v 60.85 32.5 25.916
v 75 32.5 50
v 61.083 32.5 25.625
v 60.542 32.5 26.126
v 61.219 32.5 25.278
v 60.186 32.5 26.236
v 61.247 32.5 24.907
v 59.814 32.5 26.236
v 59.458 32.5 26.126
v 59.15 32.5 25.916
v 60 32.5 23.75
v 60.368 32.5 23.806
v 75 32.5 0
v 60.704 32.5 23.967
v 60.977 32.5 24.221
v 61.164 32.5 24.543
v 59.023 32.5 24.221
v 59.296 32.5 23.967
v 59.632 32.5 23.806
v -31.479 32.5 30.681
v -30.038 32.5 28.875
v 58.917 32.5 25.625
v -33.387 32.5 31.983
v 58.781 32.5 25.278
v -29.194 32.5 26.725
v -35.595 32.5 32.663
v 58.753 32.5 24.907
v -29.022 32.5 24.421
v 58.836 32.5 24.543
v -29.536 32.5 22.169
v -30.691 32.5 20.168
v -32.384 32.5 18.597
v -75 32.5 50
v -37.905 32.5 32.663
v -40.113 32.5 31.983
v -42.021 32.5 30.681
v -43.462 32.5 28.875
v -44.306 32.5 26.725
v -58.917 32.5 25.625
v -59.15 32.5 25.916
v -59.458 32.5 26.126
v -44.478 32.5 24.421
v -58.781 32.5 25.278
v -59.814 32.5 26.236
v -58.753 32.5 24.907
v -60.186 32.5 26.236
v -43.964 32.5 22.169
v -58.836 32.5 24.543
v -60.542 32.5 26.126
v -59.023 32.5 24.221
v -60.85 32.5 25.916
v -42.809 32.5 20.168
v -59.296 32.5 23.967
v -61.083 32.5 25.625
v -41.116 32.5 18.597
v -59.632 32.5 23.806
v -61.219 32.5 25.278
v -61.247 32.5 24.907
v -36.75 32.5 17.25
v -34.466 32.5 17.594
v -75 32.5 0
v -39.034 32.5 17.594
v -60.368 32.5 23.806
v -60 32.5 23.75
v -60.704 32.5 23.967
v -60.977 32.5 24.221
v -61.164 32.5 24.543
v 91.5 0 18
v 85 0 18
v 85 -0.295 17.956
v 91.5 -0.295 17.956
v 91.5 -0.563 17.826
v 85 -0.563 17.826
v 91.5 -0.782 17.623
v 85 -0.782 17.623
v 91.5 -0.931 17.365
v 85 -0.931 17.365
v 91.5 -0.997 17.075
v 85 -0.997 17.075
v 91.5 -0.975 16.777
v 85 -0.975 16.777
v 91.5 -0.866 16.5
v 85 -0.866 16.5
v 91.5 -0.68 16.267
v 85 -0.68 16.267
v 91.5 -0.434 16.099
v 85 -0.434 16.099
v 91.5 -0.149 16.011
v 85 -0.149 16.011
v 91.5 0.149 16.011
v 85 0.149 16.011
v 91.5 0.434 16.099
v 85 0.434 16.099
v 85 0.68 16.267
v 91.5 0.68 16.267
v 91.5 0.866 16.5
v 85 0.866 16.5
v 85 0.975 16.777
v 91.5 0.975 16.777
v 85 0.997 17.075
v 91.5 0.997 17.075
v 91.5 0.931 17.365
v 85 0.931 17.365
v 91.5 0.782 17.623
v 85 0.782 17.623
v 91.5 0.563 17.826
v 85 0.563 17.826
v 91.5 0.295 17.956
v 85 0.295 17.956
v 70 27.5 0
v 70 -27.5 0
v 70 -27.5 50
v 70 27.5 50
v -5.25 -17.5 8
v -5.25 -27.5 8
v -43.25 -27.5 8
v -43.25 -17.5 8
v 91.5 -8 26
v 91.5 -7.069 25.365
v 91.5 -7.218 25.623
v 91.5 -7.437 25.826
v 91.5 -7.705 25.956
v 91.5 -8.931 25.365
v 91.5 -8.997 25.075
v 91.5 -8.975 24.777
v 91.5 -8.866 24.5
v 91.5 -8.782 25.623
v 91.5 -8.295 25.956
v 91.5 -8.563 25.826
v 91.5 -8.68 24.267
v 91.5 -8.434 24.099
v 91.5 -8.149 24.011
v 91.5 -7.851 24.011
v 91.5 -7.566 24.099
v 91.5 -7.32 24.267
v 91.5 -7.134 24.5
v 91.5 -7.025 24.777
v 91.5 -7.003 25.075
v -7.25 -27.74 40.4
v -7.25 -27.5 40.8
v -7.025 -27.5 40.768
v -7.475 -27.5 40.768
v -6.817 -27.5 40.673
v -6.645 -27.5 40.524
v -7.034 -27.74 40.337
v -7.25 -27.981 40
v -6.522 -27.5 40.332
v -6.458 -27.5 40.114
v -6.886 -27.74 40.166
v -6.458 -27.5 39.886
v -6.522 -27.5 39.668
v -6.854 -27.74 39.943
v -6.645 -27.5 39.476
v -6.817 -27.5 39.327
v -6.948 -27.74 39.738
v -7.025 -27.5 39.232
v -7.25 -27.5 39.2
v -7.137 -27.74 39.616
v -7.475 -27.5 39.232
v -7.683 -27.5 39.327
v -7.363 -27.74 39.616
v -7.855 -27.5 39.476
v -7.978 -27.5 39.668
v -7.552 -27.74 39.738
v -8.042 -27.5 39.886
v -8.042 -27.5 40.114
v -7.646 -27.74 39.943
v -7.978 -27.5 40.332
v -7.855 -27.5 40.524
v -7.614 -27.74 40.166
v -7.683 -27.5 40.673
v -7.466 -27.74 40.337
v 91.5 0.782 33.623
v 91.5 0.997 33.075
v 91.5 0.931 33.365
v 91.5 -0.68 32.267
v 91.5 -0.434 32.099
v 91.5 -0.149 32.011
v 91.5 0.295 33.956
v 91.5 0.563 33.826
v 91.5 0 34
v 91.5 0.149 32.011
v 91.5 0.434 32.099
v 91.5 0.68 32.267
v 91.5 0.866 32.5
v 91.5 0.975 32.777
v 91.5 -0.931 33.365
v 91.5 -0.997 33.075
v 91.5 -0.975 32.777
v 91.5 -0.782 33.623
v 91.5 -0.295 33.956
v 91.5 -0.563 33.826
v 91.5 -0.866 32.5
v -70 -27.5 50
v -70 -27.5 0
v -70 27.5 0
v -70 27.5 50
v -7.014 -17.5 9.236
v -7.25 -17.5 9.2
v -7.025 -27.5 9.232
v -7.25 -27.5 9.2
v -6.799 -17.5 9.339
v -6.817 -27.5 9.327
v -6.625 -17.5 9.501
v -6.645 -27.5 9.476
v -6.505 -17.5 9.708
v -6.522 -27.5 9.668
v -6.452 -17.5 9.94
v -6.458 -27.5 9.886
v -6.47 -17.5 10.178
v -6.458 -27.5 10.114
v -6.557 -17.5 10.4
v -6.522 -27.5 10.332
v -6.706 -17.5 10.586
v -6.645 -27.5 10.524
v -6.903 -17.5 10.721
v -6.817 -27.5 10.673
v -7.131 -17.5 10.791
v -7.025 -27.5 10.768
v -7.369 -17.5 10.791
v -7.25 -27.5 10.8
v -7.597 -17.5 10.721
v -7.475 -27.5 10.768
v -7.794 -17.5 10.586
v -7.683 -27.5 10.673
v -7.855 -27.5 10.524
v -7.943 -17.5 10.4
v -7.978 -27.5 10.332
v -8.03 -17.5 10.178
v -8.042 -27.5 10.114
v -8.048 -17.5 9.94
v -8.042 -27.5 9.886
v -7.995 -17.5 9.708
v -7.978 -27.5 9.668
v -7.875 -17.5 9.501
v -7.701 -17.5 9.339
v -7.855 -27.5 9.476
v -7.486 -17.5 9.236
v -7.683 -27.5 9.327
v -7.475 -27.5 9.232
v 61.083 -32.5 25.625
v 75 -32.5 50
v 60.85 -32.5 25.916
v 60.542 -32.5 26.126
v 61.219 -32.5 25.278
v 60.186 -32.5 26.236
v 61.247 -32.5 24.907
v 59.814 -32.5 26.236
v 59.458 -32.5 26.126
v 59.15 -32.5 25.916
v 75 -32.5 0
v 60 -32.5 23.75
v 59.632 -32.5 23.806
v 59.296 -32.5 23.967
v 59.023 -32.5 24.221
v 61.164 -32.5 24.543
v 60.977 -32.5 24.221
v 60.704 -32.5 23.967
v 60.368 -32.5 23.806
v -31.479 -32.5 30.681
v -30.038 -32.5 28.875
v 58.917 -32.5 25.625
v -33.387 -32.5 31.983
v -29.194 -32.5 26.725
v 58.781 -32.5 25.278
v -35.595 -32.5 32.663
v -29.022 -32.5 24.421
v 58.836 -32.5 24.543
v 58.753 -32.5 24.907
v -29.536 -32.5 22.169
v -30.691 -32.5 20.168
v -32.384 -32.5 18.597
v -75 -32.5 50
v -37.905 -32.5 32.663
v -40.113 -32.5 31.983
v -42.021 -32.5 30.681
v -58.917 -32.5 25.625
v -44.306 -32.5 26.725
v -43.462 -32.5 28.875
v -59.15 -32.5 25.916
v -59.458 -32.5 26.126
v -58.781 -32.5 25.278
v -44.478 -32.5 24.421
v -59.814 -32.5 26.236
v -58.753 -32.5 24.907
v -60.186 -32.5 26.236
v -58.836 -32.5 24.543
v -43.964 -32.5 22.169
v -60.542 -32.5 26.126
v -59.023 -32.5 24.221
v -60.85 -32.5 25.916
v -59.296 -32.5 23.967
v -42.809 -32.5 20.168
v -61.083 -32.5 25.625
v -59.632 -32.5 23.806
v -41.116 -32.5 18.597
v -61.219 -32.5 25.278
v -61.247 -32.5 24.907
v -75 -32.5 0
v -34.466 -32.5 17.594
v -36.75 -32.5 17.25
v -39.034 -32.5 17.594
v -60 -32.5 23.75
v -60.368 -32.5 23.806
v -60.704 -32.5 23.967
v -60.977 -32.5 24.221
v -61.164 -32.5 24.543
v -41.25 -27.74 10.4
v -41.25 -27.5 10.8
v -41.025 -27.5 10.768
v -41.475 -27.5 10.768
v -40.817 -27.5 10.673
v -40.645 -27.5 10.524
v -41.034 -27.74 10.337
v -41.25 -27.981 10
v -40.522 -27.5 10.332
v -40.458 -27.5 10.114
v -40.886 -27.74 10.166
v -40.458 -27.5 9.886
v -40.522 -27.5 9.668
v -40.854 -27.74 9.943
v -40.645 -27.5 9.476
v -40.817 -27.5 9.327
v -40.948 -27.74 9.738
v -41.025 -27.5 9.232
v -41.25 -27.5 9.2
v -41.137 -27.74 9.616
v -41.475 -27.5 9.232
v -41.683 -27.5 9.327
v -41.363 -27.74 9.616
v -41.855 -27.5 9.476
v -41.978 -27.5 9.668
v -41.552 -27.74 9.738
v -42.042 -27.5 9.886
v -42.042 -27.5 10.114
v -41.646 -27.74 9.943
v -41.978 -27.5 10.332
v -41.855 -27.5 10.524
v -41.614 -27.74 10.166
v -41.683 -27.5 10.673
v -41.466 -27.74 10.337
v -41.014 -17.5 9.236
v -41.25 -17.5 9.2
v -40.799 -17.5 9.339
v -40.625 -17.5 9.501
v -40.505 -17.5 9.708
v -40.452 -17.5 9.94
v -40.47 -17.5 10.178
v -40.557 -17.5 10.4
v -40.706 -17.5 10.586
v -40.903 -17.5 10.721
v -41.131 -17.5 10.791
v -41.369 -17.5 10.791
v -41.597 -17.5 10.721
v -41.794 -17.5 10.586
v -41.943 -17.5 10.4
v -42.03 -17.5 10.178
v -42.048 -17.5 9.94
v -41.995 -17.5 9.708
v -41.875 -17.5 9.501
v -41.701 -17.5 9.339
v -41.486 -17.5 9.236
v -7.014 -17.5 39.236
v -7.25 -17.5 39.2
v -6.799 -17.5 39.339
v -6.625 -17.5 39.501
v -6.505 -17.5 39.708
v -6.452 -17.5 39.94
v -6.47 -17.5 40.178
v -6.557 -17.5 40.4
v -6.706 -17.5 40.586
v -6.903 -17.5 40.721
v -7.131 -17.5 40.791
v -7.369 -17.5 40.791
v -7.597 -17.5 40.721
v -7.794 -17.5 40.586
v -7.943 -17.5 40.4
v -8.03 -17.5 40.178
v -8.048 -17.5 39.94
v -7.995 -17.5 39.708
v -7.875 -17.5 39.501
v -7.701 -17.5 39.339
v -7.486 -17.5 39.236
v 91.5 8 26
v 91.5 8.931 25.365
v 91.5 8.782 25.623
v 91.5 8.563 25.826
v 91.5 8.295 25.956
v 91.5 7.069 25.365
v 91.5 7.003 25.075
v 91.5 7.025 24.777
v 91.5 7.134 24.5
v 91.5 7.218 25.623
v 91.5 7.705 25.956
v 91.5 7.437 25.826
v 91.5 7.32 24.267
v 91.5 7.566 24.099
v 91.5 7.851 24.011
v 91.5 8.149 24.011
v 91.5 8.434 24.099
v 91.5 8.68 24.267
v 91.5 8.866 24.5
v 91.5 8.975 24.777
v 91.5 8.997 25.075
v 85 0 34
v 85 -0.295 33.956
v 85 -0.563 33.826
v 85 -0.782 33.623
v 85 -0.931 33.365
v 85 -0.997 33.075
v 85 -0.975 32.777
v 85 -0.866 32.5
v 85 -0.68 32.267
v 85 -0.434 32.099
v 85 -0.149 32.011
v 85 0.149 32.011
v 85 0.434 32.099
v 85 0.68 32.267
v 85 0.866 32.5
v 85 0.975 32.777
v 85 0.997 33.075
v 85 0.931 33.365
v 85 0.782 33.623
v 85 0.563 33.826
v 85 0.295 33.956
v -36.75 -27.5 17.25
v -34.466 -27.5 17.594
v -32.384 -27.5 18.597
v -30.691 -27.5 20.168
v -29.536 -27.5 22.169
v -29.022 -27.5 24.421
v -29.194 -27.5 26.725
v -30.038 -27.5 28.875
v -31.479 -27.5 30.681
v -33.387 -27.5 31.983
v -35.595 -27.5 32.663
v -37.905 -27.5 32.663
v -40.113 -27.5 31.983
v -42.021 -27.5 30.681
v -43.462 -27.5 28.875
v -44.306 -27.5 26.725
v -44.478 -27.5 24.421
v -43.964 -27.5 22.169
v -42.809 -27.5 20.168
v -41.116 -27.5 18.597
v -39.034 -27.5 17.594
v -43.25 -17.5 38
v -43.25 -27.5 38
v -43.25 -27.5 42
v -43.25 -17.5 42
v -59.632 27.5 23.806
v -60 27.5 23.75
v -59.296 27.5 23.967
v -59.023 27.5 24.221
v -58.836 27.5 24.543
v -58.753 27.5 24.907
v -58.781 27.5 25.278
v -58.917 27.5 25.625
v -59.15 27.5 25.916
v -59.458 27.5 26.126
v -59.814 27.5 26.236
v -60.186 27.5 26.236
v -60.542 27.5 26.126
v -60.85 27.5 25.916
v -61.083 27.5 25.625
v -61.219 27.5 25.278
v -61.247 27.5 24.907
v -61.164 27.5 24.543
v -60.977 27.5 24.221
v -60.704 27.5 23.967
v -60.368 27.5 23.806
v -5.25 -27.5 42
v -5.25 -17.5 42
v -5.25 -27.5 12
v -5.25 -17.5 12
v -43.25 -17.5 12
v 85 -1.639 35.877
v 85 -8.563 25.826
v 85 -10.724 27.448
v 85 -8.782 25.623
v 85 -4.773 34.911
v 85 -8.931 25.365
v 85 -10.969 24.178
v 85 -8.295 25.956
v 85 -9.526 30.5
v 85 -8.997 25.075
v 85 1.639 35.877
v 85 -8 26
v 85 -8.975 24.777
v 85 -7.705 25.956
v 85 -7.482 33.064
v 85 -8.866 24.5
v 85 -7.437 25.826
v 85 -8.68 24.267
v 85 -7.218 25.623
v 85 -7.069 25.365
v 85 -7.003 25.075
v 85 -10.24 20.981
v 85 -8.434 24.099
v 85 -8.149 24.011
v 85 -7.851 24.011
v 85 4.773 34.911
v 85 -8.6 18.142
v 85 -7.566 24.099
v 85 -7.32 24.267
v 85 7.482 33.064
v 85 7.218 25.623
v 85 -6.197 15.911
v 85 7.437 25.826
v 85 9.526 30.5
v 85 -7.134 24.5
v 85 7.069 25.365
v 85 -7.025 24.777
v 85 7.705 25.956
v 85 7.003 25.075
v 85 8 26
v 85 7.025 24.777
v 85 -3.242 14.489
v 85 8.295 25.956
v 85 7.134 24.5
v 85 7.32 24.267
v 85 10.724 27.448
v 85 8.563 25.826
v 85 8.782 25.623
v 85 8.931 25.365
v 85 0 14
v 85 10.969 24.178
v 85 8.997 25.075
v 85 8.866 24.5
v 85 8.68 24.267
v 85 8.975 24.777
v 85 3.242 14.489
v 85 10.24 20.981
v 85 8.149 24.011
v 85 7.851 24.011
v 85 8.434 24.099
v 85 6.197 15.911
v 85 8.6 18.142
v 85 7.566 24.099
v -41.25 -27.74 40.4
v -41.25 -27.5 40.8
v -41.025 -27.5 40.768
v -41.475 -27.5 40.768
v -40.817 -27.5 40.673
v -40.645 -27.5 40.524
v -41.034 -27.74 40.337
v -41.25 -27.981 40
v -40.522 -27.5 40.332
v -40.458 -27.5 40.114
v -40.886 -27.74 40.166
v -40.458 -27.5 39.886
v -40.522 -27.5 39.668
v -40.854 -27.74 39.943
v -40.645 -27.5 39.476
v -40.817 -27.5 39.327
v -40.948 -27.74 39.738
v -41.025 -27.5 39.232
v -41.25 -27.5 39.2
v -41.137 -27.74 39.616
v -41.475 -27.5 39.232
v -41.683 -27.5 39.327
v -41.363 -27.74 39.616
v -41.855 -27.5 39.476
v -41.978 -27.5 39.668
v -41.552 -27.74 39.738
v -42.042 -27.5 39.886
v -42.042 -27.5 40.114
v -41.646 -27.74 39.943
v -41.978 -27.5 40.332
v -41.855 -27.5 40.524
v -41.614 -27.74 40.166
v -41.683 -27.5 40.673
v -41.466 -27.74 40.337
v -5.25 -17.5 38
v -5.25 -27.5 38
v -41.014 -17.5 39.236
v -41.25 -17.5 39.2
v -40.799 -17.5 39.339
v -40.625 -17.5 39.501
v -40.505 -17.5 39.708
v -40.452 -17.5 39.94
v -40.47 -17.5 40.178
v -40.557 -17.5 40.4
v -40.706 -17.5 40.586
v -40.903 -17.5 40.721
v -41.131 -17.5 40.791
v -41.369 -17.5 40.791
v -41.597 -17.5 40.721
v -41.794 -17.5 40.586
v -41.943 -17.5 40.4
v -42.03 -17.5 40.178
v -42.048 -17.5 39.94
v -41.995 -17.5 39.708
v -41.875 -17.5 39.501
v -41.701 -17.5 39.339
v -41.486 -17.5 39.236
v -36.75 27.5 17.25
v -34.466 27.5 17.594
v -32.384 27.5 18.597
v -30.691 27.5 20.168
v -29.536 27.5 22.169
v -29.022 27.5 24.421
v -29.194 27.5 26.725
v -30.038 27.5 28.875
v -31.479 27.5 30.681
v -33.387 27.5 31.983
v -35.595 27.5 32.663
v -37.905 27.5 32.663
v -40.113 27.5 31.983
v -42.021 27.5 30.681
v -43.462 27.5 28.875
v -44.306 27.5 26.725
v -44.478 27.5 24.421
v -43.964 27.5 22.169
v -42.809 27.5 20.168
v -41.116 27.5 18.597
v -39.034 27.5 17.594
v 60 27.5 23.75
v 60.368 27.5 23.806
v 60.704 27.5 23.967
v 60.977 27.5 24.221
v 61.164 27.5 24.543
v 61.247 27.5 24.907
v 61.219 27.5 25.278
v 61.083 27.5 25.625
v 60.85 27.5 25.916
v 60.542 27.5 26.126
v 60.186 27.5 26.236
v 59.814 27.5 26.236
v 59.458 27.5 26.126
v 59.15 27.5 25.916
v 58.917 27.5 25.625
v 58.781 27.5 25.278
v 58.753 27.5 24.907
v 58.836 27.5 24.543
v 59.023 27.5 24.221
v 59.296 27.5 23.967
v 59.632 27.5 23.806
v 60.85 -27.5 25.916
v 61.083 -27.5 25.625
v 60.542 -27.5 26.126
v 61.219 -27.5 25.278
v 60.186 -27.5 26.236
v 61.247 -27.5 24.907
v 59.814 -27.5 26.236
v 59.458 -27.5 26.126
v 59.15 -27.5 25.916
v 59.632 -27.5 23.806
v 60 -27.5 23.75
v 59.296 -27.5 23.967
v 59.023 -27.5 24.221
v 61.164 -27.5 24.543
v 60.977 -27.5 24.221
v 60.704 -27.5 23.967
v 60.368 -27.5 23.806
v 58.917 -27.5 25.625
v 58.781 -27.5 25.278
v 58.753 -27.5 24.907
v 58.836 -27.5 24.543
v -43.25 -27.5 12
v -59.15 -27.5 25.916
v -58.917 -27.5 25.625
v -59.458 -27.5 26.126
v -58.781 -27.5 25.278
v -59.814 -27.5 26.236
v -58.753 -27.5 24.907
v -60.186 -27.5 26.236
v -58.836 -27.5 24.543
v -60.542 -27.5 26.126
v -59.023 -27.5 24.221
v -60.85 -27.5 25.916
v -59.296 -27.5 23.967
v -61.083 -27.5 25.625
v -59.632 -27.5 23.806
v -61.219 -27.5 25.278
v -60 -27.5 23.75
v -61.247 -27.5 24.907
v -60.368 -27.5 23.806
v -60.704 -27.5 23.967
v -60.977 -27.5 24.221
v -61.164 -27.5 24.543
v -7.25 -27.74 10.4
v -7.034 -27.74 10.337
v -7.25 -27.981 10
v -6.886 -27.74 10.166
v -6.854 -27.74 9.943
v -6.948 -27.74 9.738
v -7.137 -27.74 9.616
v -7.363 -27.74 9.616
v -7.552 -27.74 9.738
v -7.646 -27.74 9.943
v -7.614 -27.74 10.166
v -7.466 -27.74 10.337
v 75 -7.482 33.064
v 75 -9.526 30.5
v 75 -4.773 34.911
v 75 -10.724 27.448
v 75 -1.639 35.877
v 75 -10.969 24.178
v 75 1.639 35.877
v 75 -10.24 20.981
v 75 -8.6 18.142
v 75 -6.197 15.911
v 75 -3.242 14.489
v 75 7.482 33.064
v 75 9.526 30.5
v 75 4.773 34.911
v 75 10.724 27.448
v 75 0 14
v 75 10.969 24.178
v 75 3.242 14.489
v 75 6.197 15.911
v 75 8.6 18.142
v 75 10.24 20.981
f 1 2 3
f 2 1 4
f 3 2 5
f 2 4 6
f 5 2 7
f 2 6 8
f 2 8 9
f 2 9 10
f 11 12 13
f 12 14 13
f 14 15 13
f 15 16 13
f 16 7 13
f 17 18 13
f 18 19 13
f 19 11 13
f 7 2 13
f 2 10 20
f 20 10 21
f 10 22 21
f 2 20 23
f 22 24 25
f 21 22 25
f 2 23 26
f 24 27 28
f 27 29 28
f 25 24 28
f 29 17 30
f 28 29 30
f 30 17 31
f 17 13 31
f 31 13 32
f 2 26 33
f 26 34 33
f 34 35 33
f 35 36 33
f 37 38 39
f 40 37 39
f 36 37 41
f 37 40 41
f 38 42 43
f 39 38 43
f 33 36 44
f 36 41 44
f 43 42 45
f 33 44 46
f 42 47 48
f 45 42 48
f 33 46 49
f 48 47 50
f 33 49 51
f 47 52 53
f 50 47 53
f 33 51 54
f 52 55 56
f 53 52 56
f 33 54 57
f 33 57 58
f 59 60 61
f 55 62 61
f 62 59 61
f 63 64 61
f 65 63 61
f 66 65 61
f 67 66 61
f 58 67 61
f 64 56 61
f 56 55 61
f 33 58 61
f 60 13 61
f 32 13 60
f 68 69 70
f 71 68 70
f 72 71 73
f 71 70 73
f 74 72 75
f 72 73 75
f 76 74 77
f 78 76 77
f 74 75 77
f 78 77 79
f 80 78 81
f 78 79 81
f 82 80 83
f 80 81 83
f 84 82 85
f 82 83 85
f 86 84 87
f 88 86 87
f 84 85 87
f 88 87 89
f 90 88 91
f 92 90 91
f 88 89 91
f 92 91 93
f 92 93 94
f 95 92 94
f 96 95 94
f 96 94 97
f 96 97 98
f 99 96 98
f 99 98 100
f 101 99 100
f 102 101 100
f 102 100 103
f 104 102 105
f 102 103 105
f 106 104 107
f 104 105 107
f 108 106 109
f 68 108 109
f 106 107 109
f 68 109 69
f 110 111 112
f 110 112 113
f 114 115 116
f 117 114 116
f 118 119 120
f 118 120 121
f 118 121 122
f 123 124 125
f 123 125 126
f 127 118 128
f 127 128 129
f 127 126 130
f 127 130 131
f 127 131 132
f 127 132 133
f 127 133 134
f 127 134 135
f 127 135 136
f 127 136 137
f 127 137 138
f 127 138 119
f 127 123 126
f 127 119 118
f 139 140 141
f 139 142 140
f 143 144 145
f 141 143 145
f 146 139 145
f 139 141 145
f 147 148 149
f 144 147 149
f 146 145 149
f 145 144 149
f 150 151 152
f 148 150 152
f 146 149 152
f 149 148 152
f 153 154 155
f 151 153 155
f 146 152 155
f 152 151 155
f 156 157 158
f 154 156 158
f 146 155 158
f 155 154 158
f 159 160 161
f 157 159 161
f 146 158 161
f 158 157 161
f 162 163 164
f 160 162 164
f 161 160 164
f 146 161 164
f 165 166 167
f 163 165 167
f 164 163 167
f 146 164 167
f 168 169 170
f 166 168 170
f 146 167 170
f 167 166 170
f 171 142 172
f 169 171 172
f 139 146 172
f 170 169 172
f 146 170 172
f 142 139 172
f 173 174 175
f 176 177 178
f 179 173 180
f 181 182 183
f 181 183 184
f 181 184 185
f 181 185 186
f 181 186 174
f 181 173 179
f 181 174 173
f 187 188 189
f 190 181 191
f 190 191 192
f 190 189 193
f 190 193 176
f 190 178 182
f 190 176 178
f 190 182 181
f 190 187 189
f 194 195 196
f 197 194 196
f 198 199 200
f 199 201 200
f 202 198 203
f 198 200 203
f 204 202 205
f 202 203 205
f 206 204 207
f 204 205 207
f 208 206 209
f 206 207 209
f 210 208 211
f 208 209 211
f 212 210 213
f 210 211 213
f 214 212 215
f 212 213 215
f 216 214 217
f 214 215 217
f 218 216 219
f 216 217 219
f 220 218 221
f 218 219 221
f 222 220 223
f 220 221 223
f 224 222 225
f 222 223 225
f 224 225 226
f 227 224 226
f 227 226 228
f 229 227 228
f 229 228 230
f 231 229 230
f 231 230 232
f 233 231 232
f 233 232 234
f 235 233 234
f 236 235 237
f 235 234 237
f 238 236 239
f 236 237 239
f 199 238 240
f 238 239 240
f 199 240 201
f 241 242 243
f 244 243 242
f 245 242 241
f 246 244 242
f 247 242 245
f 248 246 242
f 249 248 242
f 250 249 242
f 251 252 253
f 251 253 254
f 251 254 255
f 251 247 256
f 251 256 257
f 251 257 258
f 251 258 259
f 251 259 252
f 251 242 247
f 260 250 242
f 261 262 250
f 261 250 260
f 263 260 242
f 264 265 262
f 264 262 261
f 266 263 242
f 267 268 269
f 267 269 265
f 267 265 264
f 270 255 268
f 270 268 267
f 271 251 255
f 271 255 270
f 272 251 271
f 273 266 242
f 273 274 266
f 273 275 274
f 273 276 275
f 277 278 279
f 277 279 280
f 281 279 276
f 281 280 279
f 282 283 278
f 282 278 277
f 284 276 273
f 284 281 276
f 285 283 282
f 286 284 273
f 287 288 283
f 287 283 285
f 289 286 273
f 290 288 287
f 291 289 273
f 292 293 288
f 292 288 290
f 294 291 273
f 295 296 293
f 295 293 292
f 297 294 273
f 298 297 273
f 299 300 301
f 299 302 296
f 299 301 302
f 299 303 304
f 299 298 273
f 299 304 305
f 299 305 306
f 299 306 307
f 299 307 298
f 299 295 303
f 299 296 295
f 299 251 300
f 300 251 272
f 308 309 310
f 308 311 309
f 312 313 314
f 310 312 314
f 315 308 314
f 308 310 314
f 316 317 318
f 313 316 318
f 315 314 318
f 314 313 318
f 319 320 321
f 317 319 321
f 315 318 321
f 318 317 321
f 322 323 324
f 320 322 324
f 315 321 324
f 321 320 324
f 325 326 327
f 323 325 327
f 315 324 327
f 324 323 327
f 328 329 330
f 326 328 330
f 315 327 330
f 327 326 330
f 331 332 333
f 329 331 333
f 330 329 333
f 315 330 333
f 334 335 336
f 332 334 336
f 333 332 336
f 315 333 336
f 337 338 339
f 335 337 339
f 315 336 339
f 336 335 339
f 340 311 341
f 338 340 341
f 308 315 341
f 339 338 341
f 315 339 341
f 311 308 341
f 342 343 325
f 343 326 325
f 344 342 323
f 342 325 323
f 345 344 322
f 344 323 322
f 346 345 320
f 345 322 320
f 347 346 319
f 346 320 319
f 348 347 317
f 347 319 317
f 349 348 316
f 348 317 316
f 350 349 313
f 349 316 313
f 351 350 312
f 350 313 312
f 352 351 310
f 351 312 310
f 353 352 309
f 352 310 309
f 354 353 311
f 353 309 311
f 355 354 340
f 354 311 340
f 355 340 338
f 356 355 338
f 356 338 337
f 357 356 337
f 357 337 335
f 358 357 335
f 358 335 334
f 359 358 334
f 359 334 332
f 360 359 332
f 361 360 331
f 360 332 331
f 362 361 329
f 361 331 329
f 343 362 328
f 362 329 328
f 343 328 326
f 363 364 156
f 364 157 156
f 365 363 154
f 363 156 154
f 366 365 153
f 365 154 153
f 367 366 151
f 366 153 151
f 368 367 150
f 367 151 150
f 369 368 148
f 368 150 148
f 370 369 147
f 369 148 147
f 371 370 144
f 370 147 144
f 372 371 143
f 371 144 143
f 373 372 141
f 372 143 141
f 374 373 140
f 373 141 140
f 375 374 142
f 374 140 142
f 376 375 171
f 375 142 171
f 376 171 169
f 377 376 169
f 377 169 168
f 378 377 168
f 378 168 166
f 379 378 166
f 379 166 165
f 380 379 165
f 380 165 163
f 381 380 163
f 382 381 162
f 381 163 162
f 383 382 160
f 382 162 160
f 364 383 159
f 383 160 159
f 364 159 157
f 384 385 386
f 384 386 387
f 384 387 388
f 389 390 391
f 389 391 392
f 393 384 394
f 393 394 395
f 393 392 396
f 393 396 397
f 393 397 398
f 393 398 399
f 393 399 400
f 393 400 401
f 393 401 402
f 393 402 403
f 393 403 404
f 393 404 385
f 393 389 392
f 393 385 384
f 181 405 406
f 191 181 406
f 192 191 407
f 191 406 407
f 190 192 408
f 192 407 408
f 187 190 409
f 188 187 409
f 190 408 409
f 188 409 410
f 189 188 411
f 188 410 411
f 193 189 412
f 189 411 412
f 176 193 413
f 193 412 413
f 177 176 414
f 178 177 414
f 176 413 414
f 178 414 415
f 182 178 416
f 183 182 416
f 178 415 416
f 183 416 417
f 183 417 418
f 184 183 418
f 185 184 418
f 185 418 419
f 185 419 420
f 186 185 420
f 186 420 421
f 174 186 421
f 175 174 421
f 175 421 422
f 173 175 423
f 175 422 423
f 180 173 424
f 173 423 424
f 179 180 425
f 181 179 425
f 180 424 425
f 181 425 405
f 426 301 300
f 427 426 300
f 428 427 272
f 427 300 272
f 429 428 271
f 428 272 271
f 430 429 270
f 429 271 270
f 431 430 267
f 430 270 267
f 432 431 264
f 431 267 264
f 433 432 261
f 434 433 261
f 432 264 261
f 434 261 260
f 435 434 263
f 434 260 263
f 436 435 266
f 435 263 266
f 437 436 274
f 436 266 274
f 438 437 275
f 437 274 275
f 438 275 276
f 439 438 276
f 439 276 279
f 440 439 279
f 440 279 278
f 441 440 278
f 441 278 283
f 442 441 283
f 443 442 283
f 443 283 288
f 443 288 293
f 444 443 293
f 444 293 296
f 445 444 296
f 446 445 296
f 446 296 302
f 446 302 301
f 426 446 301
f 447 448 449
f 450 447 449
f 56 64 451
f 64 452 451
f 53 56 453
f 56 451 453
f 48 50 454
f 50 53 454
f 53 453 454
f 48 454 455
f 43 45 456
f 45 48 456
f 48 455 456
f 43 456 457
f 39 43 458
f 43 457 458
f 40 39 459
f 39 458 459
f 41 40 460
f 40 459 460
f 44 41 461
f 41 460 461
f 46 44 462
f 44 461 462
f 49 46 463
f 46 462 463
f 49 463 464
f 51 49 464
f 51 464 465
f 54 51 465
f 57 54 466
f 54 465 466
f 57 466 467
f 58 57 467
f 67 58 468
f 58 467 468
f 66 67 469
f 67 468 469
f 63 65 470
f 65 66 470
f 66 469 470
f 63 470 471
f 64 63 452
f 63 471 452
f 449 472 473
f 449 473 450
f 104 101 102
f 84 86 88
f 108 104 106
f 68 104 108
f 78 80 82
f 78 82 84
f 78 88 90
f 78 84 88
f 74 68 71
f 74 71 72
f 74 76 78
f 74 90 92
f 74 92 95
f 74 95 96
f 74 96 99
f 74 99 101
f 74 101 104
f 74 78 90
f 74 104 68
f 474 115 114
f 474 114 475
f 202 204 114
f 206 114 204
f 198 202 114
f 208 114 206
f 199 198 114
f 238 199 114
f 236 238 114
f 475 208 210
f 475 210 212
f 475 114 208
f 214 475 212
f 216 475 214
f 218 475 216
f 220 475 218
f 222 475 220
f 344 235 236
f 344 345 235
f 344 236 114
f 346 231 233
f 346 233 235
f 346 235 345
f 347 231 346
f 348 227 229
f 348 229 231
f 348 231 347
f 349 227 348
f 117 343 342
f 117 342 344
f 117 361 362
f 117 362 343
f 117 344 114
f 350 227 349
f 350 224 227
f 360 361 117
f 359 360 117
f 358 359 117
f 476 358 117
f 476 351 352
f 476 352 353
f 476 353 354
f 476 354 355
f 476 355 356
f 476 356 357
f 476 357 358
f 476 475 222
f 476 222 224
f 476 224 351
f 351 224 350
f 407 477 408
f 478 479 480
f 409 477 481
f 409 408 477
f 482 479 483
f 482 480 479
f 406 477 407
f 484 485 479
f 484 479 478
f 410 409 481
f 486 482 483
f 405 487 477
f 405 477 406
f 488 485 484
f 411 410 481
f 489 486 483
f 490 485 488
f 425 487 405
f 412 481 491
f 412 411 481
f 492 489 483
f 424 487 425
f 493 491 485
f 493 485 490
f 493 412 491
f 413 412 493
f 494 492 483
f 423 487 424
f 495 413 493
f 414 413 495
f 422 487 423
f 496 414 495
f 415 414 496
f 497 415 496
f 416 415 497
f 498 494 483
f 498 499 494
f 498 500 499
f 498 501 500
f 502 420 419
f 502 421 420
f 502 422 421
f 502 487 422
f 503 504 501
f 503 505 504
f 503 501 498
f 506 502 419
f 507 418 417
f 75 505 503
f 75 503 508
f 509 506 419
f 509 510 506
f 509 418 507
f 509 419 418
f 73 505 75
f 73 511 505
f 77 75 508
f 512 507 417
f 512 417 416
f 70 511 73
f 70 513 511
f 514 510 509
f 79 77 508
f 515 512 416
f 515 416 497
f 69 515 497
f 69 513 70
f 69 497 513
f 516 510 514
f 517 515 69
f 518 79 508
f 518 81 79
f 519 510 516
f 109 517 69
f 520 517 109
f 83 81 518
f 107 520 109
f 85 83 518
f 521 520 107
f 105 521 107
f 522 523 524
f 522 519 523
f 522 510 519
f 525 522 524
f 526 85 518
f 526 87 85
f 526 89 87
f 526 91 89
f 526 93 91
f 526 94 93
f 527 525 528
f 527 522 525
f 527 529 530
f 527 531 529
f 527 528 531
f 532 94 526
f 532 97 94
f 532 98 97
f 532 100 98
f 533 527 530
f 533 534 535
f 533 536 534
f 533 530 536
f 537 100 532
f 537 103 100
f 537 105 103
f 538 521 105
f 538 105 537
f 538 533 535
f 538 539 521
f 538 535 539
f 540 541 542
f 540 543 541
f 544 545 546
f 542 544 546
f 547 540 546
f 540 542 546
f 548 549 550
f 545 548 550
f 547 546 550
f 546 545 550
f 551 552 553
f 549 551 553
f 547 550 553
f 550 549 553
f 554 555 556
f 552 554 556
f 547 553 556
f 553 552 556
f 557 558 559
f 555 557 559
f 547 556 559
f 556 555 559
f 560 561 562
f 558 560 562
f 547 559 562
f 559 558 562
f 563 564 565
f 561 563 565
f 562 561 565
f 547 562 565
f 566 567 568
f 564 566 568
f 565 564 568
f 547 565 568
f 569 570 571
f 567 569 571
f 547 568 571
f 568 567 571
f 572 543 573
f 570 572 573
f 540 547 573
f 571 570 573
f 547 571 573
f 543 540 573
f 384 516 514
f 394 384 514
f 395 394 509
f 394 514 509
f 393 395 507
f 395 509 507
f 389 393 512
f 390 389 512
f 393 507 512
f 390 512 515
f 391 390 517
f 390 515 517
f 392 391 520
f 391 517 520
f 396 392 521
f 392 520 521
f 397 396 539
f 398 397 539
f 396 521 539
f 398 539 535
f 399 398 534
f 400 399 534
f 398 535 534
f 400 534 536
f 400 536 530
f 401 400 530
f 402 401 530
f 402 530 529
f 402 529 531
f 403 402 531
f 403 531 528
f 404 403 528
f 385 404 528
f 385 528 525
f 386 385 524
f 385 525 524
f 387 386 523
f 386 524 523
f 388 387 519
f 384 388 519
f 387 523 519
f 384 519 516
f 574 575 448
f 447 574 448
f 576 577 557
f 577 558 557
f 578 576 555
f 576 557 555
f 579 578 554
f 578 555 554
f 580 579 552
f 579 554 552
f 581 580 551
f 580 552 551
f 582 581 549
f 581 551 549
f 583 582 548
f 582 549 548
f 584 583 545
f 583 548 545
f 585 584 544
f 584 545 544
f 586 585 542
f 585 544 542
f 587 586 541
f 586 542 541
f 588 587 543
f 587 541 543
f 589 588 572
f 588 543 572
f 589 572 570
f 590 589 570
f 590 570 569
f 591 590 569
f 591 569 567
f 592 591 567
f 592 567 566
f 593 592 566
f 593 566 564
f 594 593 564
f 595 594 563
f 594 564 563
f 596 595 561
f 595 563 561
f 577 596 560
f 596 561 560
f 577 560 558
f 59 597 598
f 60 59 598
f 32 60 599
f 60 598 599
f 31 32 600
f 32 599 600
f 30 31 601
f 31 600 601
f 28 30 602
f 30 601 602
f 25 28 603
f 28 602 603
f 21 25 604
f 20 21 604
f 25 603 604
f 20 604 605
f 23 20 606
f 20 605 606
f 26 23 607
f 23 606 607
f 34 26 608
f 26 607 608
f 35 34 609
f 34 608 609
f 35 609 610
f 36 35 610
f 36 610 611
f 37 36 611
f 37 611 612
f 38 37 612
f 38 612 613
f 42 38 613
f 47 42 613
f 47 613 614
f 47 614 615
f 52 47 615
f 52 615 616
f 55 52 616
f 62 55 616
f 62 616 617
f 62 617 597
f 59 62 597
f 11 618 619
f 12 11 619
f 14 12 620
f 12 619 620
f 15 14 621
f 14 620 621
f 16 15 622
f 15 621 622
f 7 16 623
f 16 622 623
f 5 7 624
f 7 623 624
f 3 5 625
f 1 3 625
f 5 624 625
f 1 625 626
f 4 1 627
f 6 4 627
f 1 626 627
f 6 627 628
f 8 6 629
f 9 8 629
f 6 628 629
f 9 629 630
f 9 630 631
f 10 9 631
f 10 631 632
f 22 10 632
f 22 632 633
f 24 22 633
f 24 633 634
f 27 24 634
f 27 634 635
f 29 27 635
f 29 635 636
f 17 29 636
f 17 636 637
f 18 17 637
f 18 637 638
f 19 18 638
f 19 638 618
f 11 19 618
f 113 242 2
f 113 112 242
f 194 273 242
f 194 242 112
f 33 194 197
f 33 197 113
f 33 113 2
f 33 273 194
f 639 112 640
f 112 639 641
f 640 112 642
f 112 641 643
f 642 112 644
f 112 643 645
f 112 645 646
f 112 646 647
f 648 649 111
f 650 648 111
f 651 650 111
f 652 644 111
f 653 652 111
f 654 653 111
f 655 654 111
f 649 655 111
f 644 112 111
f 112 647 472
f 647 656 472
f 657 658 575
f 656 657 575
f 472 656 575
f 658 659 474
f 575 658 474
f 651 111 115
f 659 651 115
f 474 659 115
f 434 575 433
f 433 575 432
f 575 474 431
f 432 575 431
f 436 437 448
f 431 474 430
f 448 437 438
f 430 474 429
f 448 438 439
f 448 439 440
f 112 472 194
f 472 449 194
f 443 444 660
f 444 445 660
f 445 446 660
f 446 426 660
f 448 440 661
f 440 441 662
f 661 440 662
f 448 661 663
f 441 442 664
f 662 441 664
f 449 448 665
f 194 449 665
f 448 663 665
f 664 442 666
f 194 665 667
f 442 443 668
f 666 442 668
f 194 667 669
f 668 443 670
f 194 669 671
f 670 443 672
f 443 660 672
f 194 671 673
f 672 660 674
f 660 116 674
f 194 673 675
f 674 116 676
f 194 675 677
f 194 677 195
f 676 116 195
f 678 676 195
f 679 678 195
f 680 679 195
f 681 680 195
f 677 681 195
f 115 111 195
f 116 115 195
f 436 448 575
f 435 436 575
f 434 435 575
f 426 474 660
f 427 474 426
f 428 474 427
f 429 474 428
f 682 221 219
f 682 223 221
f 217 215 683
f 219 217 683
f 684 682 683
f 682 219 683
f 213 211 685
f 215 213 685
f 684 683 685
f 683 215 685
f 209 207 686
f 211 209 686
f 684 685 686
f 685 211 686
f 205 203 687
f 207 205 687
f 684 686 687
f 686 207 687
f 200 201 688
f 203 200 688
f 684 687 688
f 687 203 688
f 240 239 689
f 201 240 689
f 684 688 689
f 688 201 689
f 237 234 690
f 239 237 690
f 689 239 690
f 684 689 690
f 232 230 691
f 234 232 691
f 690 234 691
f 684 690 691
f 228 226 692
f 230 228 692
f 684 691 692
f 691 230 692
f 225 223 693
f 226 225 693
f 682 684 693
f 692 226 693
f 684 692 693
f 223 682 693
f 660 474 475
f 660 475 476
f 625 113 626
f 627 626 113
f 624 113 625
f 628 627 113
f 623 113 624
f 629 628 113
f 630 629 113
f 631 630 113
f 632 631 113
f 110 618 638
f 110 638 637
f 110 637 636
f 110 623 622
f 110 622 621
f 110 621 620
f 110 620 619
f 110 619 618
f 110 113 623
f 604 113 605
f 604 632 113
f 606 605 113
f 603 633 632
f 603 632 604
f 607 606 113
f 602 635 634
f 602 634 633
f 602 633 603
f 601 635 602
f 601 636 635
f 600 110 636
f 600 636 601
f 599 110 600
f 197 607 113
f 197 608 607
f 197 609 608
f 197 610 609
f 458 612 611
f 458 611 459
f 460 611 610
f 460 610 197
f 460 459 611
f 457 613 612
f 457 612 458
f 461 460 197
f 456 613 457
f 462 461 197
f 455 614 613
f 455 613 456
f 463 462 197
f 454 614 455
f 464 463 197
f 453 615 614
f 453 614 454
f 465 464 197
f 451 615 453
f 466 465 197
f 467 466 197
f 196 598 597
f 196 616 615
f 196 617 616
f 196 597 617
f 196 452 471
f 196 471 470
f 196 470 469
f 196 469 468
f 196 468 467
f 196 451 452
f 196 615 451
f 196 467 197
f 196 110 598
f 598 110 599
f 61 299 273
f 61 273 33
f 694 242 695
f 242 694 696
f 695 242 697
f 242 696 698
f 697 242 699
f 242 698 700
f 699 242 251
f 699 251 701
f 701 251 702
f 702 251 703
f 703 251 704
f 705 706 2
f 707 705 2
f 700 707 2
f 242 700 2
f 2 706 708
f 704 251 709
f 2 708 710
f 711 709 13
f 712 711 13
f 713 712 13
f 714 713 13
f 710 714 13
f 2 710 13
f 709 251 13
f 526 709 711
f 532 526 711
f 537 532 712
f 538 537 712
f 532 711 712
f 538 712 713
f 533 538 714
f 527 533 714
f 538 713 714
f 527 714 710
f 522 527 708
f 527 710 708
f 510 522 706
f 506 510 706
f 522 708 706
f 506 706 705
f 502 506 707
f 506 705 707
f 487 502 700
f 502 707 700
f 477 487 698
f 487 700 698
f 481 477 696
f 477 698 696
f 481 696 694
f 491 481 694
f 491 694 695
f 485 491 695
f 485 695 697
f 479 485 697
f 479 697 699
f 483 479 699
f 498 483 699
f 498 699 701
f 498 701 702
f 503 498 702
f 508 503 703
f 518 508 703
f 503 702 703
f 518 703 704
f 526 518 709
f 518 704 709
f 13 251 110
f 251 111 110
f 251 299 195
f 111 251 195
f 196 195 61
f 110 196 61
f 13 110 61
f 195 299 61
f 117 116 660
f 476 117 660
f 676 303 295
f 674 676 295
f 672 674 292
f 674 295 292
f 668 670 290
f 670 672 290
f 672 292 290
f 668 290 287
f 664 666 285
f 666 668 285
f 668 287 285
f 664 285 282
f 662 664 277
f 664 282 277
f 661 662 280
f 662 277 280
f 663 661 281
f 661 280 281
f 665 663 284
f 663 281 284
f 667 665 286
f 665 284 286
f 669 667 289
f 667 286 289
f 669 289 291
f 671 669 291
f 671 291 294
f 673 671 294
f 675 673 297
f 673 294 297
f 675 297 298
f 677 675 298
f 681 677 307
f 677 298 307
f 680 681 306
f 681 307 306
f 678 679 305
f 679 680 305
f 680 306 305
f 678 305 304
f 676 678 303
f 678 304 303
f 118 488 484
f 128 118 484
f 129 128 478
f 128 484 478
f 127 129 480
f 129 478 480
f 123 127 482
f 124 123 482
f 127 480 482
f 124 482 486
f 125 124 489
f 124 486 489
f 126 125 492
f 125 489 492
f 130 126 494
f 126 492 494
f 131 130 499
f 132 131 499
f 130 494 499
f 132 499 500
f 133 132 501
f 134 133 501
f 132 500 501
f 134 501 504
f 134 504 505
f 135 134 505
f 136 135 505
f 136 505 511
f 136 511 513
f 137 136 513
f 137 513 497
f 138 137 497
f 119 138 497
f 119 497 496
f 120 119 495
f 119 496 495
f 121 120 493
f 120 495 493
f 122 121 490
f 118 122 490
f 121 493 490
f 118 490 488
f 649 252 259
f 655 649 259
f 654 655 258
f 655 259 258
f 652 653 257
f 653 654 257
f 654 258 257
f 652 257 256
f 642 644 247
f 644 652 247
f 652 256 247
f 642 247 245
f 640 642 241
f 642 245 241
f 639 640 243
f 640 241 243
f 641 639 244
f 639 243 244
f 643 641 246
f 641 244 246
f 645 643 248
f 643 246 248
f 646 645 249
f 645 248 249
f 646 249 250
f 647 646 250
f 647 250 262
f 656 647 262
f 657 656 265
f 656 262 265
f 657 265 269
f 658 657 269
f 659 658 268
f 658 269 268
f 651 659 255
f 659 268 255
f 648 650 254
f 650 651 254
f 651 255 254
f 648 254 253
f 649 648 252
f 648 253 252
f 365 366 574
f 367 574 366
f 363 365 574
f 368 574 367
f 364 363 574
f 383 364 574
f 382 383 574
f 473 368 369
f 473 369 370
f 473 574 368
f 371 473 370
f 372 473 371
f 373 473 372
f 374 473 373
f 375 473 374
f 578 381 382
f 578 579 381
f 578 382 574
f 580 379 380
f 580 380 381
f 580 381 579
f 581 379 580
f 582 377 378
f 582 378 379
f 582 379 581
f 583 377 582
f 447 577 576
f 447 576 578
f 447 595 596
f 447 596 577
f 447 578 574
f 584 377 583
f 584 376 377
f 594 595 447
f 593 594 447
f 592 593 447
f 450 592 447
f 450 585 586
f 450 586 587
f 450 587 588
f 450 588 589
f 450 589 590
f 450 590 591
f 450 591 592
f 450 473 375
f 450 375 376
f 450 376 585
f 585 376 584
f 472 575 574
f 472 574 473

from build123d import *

# Parameters (mm, degrees)
SKETCH1_W                           = 65
SKETCH1_H                           = 150
SKETCH1_W_2                         = 55
SKETCH1_H_2                         = 140
BOSS_EXTRUDE1_DEPTH                 = 50
SKETCH2_R                           = 1.25
CUT_EXTRUDE1_DEPTH                  = 112.130553854
SKETCH3_R                           = 7.75
CUT_EXTRUDE2_DEPTH                  = 112.130553854
M3X0_5_TAPPED_HOLE3_D               = 2.5
M3X0_5_TAPPED_HOLE3_DEPTH           = 5
M3X0_5_TAPPED_HOLE3_TIP             = 0.751075774
M3X0_5_TAPPED_HOLE3_ON_FACE_2_D     = 2.5
M3X0_5_TAPPED_HOLE3_ON_FACE_2_DEPTH = 5
M3X0_5_TAPPED_HOLE3_ON_FACE_2_TIP   = 0.751075774
SKETCH10_W                          = 38
SKETCH10_H                          = 4
SKETCH10_R                          = 0.5
BOSS_EXTRUDE4_DEPTH                 = 10
M2X0_4_TAPPED_HOLE1_D               = 1.6
M2X0_4_TAPPED_HOLE1_DEPTH           = 10
M2X0_4_TAPPED_HOLE1_TIP             = 0.480688495
SKETCH4_R                           = 11
BOSS_EXTRUDE5_DEPTH                 = 10
SKETCH15_R                          = 1
BOSS_EXTRUDE6_DEPTH                 = 6.5


with BuildPart() as part:
    # Sketch1 → Boss-Extrude1 (new body)
    with BuildSketch(Plane(origin=(0, 0, 0), x_dir=(0, 1, 0), z_dir=(0, 0, 1))):
        Rectangle(SKETCH1_W, SKETCH1_H)
        Rectangle(SKETCH1_W_2, SKETCH1_H_2, mode=Mode.SUBTRACT)
    extrude(amount=BOSS_EXTRUDE1_DEPTH)

    # Sketch2 → Cut-Extrude1 (cut, through all)
    with BuildSketch(Plane.XZ.offset(32.5)):
        with Locations((-60, 25)):
            Circle(SKETCH2_R)
        with Locations((60, 25)):
            Circle(SKETCH2_R)
    extrude(amount=-CUT_EXTRUDE1_DEPTH, mode=Mode.SUBTRACT)

    # Sketch3 → Cut-Extrude2 (cut, through all)
    with BuildSketch(Plane.XZ.offset(32.5)):
        with Locations((-36.75, 25)):
            Circle(SKETCH3_R)
    extrude(amount=-CUT_EXTRUDE2_DEPTH, mode=Mode.SUBTRACT)

    # M3x0.5 Tapped Hole3
    with Locations(Plane(origin=(-60, -32.5, 25), x_dir=(0, 0, -1), z_dir=(0, -1, 0))):
        with Locations((0, 0), (0, 120)):
            Hole(M3X0_5_TAPPED_HOLE3_D / 2, depth=M3X0_5_TAPPED_HOLE3_DEPTH)
            with Locations((0, 0, -(M3X0_5_TAPPED_HOLE3_DEPTH + M3X0_5_TAPPED_HOLE3_TIP / 2))):  # 118° drill point
                Cone(0, M3X0_5_TAPPED_HOLE3_D / 2, M3X0_5_TAPPED_HOLE3_TIP, mode=Mode.SUBTRACT)

    # M3x0.5 Tapped Hole3 on face 2
    with Locations(Plane(origin=(60, 32.5, 25), x_dir=(0, 0, -1), z_dir=(0, -1, 0))):
        with Locations((0, 0), (0, -120)):
            Hole(M3X0_5_TAPPED_HOLE3_ON_FACE_2_D / 2, depth=M3X0_5_TAPPED_HOLE3_ON_FACE_2_DEPTH)
            with Locations((0, 0, -(M3X0_5_TAPPED_HOLE3_ON_FACE_2_DEPTH + M3X0_5_TAPPED_HOLE3_ON_FACE_2_TIP / 2))):  # 118° drill point
                Cone(0, M3X0_5_TAPPED_HOLE3_ON_FACE_2_D / 2, M3X0_5_TAPPED_HOLE3_ON_FACE_2_TIP, mode=Mode.SUBTRACT)

    # Sketch10 → Boss-Extrude4 (add)
    # profile 1 of 2: a face of its own
    with BuildSketch(Plane(origin=(0, -27.5, 0), x_dir=(-1, 0, 0), z_dir=(0, 1, 0))):
        with Locations((24.25, 10)):
            Rectangle(SKETCH10_W, SKETCH10_H)
        with Locations((7.25, 10)):
            Circle(SKETCH10_R, mode=Mode.SUBTRACT)
        with Locations((41.25, 10)):
            Circle(SKETCH10_R, mode=Mode.SUBTRACT)
    # profile 2 of 2: a face of its own
    with BuildSketch(Plane(origin=(0, -27.5, 0), x_dir=(-1, 0, 0), z_dir=(0, 1, 0))):
        with Locations((24.25, 40)):
            Rectangle(SKETCH10_W, SKETCH10_H)
        with Locations((7.25, 40)):
            Circle(SKETCH10_R, mode=Mode.SUBTRACT)
        with Locations((41.25, 40)):
            Circle(SKETCH10_R, mode=Mode.SUBTRACT)
    extrude(amount=BOSS_EXTRUDE4_DEPTH)

    # M2x0.4 Tapped Hole1
    with Locations(Plane(origin=(-7.25, -17.5, 10), x_dir=(0, 0, 1), z_dir=(0, 1, 0))):
        with Locations((0, 0), (30, 0), (30, -34), (0, -34)):
            Hole(M2X0_4_TAPPED_HOLE1_D / 2, depth=M2X0_4_TAPPED_HOLE1_DEPTH)
            with Locations((0, 0, -(M2X0_4_TAPPED_HOLE1_DEPTH + M2X0_4_TAPPED_HOLE1_TIP / 2))):  # 118° drill point
                Cone(0, M2X0_4_TAPPED_HOLE1_D / 2, M2X0_4_TAPPED_HOLE1_TIP, mode=Mode.SUBTRACT)

    # Sketch4 → Boss-Extrude5 (add)
    with BuildSketch(Plane.YZ.offset(75)):
        with Locations((0, 25)):
            Circle(SKETCH4_R)
    extrude(amount=BOSS_EXTRUDE5_DEPTH)

    # Sketch15 → Boss-Extrude6 (add)
    with BuildSketch(Plane.YZ.offset(85)):
        with Locations((0, 33)):
            Circle(SKETCH15_R)
        with Locations((8, 25)):
            Circle(SKETCH15_R)
        with Locations((0, 17)):
            Circle(SKETCH15_R)
        with Locations((-8, 25)):
            Circle(SKETCH15_R)
    extrude(amount=BOSS_EXTRUDE6_DEPTH)


solid = part.part
